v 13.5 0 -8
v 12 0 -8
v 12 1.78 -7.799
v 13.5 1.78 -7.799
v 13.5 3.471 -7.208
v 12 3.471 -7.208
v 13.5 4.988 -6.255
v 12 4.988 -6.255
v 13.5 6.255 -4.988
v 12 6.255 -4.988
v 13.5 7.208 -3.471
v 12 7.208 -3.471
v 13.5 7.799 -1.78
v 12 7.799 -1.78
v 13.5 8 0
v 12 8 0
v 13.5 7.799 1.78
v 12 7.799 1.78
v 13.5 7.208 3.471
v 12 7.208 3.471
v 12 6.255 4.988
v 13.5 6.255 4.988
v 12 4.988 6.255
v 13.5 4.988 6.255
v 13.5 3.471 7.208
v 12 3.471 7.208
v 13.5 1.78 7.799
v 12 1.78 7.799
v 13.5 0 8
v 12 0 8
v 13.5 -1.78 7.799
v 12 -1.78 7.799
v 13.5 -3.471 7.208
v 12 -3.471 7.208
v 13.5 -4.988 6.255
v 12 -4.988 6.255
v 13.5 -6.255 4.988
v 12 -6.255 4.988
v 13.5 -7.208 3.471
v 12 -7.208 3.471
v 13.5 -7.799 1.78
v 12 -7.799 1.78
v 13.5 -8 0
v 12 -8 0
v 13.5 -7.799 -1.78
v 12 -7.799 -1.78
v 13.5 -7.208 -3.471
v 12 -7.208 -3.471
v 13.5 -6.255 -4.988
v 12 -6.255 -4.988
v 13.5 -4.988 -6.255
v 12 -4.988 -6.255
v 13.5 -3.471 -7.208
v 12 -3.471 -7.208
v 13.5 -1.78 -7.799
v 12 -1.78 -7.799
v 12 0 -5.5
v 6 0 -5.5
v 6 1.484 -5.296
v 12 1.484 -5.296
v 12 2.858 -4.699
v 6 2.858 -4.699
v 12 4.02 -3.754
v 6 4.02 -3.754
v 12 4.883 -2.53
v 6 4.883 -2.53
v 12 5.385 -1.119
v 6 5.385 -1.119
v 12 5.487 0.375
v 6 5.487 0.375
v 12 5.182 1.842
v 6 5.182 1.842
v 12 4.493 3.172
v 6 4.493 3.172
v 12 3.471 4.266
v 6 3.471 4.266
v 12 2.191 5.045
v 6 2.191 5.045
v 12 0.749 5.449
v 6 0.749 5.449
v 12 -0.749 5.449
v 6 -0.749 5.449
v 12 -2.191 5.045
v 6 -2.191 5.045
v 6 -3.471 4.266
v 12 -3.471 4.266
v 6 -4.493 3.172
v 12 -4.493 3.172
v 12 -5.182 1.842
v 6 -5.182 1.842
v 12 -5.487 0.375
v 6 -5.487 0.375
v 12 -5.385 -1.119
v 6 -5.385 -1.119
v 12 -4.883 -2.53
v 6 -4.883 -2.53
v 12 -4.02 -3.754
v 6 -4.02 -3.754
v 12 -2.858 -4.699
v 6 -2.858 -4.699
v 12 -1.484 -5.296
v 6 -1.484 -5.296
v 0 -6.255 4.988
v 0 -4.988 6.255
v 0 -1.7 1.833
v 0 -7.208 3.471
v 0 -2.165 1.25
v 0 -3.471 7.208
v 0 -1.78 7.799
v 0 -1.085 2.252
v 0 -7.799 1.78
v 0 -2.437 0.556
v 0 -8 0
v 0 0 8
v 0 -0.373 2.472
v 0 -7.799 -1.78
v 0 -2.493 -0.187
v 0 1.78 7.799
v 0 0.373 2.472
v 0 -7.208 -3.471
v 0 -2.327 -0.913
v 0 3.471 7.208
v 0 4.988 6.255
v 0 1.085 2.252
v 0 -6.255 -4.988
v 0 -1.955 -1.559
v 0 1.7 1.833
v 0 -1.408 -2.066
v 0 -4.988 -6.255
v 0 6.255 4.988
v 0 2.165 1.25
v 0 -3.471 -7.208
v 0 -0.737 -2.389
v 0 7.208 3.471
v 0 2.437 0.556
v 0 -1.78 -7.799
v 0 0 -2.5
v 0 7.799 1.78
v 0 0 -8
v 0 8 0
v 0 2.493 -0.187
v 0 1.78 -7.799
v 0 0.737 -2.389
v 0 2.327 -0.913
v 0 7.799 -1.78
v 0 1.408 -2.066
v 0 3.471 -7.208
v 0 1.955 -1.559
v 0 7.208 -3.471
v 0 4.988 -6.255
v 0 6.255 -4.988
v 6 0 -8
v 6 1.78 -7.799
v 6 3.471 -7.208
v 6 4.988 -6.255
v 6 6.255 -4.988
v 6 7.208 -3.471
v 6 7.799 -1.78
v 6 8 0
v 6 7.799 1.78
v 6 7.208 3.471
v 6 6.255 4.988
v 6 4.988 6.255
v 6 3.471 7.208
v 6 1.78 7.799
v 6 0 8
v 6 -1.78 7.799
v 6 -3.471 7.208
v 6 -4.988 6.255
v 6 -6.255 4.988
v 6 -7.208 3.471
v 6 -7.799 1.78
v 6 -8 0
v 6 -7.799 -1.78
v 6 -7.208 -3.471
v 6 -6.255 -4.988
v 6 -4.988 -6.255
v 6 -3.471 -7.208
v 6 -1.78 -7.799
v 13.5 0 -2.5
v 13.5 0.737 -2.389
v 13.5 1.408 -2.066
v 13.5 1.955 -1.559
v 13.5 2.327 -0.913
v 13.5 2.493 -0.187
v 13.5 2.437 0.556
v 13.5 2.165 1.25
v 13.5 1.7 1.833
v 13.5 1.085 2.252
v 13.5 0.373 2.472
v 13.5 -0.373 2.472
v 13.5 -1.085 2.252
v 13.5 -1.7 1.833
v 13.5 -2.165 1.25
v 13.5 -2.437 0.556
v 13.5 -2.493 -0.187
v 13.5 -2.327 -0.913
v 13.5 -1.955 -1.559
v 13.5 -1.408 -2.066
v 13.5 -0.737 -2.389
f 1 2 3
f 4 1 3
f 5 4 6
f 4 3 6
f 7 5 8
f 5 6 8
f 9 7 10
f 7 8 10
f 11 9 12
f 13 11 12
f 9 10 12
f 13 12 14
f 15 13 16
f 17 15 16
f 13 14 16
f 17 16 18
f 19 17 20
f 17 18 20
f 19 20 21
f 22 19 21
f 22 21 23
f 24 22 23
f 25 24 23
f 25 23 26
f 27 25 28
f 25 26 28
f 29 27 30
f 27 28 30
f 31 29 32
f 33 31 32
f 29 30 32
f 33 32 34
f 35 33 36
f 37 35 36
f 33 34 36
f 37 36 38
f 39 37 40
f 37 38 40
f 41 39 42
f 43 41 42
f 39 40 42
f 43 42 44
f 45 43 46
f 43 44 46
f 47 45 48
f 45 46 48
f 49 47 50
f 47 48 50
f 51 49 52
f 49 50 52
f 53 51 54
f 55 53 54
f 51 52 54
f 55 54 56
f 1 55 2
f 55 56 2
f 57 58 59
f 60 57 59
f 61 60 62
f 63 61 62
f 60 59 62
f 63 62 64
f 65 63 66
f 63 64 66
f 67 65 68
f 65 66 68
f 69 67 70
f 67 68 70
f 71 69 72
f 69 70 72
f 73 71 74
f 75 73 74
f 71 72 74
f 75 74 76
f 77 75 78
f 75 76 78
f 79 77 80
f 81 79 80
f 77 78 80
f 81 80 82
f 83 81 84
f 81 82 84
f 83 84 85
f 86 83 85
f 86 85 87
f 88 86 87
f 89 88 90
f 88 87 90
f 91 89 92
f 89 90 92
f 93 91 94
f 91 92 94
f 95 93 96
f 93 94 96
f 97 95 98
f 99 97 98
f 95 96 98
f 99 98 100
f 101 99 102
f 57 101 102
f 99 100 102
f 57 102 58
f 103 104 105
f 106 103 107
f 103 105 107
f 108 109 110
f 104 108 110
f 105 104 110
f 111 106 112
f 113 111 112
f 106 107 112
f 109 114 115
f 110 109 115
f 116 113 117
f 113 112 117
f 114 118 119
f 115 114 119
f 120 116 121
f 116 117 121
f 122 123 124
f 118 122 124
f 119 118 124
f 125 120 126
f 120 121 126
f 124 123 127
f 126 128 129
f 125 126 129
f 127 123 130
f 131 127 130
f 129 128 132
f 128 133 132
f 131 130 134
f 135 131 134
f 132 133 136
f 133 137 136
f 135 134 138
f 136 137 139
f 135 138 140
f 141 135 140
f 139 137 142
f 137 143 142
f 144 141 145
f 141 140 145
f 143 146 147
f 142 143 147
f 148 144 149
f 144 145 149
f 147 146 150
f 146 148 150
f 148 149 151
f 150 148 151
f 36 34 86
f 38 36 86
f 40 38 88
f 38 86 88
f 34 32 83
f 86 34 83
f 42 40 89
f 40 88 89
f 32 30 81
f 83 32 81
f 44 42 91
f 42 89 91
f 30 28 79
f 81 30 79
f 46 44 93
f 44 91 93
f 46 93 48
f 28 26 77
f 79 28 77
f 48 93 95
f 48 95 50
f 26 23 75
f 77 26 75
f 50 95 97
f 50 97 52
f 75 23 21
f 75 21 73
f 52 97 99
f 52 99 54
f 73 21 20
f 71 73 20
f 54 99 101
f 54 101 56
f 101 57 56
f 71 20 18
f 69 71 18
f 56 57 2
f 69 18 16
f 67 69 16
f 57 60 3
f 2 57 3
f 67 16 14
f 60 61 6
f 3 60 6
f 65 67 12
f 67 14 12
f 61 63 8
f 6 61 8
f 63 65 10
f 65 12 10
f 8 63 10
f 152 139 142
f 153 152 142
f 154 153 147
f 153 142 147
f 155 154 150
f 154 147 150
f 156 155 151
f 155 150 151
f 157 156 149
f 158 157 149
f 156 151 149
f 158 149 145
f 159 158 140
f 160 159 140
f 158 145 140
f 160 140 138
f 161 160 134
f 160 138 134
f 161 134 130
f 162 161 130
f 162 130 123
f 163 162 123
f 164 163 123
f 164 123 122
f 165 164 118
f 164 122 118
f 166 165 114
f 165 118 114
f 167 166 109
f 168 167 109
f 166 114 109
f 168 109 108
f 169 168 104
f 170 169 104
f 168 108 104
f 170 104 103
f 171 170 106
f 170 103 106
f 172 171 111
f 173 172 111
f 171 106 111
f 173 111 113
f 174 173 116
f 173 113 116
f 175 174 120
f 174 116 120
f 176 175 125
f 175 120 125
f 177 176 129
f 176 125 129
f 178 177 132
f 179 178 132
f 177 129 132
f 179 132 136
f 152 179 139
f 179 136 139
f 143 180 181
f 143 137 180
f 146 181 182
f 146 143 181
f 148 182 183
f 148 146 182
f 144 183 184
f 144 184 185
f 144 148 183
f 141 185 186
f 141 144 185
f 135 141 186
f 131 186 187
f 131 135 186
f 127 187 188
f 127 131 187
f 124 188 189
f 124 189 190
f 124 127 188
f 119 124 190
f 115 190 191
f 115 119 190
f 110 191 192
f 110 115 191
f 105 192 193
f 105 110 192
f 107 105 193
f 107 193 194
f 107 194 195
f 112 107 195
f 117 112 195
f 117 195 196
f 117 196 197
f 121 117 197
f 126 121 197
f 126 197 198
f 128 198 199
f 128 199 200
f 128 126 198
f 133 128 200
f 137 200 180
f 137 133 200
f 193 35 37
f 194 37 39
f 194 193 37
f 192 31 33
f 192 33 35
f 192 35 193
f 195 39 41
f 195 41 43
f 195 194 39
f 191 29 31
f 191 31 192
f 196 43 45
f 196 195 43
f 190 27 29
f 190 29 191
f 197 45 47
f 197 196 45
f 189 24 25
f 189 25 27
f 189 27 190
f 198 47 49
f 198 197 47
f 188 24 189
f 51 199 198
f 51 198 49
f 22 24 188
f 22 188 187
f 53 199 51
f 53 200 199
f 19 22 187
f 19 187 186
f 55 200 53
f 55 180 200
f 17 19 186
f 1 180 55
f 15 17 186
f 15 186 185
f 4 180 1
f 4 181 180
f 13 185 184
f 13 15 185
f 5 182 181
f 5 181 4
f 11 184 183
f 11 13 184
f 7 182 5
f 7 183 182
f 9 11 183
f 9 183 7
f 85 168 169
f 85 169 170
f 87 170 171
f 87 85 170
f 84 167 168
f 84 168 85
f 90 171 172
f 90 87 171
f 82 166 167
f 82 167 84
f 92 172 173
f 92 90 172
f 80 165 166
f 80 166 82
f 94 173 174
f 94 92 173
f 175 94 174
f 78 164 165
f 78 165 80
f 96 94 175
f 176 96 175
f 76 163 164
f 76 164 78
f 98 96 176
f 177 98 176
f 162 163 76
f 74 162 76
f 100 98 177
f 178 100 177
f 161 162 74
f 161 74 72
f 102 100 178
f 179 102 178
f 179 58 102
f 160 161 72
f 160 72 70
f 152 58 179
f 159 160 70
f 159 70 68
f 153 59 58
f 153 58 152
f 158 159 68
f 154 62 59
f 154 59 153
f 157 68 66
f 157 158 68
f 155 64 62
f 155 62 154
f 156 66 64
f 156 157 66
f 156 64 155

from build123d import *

# Parameters (mm, degrees)
SKETCH1_R           = 8
SKETCH1_R_2         = 2.5
BOSS_EXTRUDE1_DEPTH = 6
SKETCH2_R           = 5.5
SKETCH2_R_2         = 2.5
BOSS_EXTRUDE2_DEPTH = 6
SKETCH3_R           = 8
SKETCH3_R_2         = 2.5
BOSS_EXTRUDE3_DEPTH = 1.5


with BuildPart() as part:
    # Sketch1 → Boss-Extrude1 (new body)
    with BuildSketch(Plane(origin=(0, 0, 0), x_dir=(0, 0, -1), z_dir=(1, 0, 0))):
        Circle(SKETCH1_R)
        Circle(SKETCH1_R_2, mode=Mode.SUBTRACT)
    extrude(amount=BOSS_EXTRUDE1_DEPTH)

    # Sketch2 → Boss-Extrude2 (add)
    with BuildSketch(Plane(origin=(6, 0, 0), x_dir=(0, 0, -1), z_dir=(1, 0, 0))):
        Circle(SKETCH2_R)
        Circle(SKETCH2_R_2, mode=Mode.SUBTRACT)
    extrude(amount=BOSS_EXTRUDE2_DEPTH)

    # Sketch3 → Boss-Extrude3 (add)
    with BuildSketch(Plane(origin=(12, 0, 0), x_dir=(0, 0, -1), z_dir=(1, 0, 0))):
        Circle(SKETCH3_R)
        Circle(SKETCH3_R_2, mode=Mode.SUBTRACT)
    extrude(amount=BOSS_EXTRUDE3_DEPTH)


solid = part.part
